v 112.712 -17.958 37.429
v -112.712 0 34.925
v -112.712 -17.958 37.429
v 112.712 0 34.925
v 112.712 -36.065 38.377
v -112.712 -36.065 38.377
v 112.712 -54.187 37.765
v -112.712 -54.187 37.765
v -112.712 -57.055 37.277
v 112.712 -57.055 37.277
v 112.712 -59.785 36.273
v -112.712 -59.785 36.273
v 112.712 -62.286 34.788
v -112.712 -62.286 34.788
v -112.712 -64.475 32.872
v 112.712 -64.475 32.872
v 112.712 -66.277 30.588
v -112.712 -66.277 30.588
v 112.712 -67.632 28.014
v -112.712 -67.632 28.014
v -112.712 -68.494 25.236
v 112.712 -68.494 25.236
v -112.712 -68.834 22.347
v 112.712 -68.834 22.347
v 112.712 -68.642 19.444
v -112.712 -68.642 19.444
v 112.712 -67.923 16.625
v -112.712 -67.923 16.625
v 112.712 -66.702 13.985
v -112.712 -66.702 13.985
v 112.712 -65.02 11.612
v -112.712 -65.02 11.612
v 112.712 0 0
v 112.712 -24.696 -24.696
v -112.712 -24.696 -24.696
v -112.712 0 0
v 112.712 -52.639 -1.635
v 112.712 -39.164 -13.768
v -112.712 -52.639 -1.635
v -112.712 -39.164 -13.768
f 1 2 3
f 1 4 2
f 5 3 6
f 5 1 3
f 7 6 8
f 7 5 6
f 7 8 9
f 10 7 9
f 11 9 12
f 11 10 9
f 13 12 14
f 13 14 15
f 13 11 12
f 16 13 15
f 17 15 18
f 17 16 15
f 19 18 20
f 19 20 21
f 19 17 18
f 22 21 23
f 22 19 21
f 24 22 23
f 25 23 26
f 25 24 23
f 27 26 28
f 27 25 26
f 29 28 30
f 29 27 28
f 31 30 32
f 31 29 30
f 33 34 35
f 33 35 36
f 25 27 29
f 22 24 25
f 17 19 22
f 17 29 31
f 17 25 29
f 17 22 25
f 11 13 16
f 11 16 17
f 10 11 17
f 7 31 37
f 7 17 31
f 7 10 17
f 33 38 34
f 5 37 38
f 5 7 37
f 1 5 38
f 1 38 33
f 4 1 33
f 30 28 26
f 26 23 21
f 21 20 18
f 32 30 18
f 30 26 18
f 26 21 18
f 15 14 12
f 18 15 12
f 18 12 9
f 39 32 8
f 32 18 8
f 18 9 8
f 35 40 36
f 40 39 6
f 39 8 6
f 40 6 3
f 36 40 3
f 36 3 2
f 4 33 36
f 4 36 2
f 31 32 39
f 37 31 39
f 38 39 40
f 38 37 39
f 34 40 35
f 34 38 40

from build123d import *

# Parameters (mm, degrees)
F1_DEPTH = 112.7125


with BuildPart() as f1:
    # F0 (on Right) → F1 (new body, symmetric)
    with BuildSketch(Plane.YZ):
        with BuildLine():
            ThreePointArc((-65.019769, 11.612246), (-46.032427, -7.846355), (-24.695704, -24.695704))
            Line((-24.695704, -24.695704), (0, 0))
            Line((0, 0), (0, 34.925))
            ThreePointArc((0, 34.925), (-27.001631, 38.098052), (-54.187018, 37.764821))
            ThreePointArc((-54.187018, 37.764821), (-67.631541, 28.013901), (-65.019769, 11.612246))
        make_face()
    extrude(amount=F1_DEPTH, both=True)


solid = f1.part
